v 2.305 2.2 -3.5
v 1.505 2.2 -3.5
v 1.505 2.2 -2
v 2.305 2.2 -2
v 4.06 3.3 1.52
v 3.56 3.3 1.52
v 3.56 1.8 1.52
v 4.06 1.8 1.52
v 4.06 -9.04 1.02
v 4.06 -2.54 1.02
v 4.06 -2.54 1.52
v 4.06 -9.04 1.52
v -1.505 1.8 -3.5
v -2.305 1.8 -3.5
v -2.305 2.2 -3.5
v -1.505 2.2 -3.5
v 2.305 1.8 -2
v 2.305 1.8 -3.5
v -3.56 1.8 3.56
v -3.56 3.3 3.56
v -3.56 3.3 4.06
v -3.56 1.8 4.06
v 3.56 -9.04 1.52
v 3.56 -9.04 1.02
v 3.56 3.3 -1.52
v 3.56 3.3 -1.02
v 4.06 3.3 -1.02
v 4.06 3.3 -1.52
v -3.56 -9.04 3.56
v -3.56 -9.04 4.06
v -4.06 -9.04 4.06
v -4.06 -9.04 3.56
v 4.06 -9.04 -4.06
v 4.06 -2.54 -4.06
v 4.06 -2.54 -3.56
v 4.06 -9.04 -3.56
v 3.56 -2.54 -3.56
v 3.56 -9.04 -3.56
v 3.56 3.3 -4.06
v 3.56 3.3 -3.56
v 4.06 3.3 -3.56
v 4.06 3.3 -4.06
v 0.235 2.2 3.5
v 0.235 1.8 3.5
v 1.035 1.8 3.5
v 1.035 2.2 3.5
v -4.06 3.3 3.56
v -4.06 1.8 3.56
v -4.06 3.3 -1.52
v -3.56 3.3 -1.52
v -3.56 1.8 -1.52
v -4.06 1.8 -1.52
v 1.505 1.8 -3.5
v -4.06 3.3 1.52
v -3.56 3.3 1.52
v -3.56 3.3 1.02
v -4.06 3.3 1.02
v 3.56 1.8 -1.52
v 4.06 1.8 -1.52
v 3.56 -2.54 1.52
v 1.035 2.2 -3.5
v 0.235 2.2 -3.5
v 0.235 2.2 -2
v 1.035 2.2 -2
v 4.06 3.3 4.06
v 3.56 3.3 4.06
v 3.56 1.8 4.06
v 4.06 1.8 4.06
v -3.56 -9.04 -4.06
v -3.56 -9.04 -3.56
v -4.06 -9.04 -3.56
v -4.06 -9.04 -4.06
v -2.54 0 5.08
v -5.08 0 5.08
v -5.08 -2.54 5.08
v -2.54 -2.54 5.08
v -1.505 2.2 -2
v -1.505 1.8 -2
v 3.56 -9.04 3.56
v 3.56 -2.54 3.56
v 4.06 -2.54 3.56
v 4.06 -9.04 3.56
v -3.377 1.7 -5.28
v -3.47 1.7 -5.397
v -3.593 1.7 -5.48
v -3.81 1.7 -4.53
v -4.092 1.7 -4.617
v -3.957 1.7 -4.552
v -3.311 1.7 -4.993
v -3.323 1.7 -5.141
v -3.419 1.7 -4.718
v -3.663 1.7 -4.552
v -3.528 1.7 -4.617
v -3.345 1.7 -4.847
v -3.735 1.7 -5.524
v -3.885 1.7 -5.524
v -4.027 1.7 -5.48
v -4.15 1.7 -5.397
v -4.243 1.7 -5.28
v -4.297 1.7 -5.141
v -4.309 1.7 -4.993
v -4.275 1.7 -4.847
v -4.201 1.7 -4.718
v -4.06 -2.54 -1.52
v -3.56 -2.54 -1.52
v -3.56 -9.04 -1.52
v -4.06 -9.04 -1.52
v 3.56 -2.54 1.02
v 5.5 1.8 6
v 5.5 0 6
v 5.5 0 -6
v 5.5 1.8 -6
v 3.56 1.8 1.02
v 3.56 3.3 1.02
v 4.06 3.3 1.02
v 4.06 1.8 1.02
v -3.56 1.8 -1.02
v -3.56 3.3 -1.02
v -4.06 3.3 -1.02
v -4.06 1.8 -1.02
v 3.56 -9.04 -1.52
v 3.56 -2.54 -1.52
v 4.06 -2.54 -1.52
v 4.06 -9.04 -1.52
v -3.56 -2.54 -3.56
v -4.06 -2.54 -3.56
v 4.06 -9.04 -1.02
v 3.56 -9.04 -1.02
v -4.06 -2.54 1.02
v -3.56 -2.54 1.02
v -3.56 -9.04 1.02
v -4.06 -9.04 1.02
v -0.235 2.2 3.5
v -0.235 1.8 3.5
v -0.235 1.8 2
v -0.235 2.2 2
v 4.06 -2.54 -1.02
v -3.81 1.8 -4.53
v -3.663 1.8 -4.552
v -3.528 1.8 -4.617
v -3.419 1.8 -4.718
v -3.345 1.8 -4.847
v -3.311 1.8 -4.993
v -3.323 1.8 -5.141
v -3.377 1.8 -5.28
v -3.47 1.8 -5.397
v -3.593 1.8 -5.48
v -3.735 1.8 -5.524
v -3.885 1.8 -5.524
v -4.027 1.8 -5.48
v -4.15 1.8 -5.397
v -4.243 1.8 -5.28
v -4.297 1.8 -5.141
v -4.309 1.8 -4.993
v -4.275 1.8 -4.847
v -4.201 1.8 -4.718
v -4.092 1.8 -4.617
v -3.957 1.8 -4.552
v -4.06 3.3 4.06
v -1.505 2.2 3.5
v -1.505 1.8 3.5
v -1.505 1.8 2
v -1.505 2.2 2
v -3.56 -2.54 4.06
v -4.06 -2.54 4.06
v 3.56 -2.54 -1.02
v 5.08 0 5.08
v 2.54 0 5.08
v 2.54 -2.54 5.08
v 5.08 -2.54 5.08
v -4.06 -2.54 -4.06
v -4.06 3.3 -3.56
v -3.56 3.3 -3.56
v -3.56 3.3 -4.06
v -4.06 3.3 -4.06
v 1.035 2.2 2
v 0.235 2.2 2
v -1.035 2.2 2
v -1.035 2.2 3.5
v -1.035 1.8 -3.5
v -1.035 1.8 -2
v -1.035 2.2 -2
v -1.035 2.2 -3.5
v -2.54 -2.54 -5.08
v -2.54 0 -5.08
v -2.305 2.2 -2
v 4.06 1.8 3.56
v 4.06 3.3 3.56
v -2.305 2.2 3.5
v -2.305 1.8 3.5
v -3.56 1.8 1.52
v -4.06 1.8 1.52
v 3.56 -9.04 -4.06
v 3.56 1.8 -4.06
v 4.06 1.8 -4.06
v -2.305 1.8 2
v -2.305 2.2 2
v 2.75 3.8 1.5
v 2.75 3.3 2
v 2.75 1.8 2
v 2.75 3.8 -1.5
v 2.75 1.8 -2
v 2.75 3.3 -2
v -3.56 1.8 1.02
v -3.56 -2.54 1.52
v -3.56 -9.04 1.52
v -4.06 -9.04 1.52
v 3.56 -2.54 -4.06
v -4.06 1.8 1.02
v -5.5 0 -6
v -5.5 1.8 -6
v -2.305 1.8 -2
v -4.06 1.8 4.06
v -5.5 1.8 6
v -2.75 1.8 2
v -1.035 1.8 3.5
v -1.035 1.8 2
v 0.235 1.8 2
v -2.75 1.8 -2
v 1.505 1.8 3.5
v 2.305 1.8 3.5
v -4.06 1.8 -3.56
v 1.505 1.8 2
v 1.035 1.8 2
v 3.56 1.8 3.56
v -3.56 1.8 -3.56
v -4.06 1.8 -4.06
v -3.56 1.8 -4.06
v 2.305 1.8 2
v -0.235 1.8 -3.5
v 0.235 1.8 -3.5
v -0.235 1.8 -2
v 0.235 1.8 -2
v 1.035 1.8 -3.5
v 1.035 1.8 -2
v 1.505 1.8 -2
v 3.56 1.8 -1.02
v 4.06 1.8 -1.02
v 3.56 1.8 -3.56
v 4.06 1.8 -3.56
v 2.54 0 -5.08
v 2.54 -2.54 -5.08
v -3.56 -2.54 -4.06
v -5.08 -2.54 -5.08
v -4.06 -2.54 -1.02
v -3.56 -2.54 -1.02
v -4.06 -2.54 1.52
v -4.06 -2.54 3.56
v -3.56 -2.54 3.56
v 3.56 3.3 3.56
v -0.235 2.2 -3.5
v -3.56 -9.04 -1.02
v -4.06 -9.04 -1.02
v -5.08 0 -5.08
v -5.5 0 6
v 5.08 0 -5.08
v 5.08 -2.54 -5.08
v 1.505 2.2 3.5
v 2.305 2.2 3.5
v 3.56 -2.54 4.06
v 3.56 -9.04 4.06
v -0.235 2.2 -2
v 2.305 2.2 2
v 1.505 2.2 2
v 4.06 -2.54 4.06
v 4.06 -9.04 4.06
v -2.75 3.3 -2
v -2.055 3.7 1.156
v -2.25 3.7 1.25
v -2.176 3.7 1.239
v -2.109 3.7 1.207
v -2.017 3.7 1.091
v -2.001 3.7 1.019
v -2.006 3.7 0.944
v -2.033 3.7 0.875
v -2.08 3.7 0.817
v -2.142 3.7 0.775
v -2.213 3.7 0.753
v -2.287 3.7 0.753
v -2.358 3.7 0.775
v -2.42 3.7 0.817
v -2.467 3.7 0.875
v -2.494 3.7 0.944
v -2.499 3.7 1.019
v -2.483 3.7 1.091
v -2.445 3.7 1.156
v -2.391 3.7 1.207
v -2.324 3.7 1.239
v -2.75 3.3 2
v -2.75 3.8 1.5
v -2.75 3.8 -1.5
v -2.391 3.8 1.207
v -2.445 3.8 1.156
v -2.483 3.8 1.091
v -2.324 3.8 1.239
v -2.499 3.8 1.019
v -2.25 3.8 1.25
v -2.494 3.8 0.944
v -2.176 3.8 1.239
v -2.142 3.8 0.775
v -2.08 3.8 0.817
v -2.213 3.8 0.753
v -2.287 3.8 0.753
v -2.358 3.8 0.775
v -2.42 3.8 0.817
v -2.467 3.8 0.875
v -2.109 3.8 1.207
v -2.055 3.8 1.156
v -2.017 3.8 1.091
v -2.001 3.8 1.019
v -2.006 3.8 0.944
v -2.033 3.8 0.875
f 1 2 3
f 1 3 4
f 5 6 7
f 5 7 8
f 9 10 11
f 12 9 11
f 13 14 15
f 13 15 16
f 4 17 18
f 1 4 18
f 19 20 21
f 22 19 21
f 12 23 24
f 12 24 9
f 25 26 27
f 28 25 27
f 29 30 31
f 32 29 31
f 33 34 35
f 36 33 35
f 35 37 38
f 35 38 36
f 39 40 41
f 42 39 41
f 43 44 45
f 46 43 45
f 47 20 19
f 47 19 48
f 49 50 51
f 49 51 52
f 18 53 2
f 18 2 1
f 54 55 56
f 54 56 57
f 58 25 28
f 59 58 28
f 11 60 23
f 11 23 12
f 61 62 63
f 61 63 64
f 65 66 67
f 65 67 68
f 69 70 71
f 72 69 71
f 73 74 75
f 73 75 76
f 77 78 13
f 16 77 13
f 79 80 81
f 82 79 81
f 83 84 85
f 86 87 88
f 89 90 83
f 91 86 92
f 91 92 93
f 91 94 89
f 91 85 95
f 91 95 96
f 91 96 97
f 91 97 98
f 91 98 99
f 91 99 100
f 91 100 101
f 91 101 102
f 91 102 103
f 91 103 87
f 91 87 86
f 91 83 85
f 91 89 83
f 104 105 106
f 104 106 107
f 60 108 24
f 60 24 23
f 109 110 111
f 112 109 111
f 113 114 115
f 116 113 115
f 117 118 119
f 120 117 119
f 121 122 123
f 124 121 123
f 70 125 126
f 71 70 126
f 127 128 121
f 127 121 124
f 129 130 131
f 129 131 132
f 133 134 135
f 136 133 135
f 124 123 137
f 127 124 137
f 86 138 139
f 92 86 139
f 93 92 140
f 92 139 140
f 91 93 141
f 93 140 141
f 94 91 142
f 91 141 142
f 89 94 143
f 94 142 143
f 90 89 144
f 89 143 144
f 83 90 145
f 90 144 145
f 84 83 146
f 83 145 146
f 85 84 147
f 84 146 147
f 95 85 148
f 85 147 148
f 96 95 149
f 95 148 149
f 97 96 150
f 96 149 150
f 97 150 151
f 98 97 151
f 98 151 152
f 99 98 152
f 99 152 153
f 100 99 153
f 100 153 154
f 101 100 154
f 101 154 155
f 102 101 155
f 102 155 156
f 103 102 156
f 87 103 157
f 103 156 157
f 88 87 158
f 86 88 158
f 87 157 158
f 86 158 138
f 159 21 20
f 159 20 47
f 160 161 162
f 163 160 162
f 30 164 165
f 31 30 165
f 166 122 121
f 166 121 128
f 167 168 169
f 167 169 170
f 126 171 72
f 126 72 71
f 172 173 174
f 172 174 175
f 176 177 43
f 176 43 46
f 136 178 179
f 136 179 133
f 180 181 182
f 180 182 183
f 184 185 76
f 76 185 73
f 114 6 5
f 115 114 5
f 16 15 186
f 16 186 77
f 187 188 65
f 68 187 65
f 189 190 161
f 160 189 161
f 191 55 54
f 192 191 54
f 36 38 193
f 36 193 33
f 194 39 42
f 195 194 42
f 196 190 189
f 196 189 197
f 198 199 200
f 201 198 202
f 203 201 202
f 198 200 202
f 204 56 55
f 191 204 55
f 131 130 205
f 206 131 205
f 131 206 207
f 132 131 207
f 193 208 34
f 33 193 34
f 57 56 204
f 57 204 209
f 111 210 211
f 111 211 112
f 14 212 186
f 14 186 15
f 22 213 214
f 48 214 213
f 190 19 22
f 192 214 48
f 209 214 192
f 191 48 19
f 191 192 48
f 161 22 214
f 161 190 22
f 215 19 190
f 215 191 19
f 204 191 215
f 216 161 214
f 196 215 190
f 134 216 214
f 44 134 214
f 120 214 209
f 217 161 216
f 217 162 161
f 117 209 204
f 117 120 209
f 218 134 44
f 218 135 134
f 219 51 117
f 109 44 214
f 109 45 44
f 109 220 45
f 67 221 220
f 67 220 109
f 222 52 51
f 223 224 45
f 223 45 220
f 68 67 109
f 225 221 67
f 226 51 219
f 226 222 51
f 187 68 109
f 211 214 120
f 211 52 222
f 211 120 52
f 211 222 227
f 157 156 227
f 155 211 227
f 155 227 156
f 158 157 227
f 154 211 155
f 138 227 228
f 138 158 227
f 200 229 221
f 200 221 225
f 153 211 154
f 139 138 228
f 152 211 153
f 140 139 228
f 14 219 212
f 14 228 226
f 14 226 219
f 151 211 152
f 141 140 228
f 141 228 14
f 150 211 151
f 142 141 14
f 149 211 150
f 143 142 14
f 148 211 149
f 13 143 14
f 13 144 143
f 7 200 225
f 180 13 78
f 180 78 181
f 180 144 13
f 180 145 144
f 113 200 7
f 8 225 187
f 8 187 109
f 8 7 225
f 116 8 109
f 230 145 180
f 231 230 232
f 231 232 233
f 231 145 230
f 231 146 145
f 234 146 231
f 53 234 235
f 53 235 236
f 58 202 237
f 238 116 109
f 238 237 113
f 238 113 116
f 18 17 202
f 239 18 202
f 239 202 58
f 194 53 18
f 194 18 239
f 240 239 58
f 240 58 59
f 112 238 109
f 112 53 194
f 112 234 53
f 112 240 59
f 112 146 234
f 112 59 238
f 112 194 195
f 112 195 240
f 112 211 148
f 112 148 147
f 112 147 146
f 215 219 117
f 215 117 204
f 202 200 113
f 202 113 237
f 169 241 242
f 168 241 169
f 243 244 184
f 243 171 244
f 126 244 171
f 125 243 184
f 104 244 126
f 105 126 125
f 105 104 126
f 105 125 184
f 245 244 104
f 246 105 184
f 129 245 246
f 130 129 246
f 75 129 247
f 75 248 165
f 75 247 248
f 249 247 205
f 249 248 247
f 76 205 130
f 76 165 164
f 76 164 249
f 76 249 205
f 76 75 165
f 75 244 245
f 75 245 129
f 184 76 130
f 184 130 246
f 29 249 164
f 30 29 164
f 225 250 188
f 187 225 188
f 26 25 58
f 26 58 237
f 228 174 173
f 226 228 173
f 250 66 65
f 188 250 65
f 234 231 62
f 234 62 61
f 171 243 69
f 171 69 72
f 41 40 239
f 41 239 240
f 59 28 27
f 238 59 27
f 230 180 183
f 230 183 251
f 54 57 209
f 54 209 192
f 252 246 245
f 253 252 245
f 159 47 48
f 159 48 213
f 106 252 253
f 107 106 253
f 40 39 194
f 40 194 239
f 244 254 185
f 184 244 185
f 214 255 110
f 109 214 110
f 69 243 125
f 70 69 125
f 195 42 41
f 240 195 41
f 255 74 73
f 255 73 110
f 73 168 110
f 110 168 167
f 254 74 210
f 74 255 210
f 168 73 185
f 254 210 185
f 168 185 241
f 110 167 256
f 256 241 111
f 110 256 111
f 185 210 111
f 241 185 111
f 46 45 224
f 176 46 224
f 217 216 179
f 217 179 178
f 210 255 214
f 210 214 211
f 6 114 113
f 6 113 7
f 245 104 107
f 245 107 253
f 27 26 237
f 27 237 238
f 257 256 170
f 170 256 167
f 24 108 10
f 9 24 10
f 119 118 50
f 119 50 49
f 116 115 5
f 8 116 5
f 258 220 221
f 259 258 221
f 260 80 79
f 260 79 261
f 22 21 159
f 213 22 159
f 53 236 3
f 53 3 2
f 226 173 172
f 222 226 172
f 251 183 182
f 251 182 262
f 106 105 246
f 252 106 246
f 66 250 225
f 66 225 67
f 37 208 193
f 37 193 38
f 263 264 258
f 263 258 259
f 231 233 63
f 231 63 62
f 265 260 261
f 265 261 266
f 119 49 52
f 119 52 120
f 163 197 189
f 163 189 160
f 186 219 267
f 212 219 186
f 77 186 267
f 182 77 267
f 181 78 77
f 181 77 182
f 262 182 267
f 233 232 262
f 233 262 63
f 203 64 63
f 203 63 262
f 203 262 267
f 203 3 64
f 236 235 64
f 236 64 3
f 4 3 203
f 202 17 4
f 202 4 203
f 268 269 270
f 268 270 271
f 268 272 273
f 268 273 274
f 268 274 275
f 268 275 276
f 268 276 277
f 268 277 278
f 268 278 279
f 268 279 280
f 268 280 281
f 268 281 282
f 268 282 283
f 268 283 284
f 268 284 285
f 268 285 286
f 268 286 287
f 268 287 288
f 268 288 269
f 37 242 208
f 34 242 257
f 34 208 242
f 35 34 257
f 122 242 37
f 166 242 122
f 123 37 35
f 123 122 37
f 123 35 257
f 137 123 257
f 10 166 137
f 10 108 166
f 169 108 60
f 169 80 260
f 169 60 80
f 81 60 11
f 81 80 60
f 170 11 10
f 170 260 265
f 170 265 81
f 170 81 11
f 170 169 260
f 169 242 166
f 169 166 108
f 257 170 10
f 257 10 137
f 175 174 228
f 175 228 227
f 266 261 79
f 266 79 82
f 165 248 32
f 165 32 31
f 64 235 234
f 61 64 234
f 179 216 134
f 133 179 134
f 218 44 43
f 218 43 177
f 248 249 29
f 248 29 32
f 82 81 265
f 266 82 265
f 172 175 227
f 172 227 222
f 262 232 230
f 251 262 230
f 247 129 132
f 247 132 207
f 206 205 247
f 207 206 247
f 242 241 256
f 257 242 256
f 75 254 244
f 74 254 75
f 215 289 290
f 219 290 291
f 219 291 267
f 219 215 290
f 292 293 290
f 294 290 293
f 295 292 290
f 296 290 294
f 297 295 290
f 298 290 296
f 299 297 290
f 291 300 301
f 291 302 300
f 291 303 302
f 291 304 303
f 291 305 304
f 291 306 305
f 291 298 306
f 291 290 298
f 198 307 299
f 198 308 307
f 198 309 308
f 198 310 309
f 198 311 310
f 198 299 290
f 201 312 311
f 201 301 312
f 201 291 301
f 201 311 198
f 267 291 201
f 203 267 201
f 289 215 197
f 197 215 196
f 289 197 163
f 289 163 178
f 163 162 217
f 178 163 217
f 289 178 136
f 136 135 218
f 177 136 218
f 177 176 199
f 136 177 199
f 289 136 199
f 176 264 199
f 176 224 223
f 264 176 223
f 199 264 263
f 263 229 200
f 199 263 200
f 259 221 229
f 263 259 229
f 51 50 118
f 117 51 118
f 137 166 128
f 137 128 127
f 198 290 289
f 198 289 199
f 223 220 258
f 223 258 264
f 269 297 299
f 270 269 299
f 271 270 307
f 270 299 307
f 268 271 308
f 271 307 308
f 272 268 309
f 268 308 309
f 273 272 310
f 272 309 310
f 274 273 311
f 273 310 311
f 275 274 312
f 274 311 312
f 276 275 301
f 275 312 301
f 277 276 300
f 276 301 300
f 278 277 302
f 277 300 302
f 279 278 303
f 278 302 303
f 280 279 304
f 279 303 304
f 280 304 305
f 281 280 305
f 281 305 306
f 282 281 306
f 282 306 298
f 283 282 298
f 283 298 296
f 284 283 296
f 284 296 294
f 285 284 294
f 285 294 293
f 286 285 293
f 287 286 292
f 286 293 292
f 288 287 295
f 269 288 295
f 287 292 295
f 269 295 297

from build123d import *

# Parameters (mm, degrees)
SKETCH1_W           = 11
SKETCH1_H           = 12
BOSS_EXTRUDE1_DEPTH = 1.8
SKETCH2_W           = 2.54
SKETCH2_H           = 10.16
BOSS_EXTRUDE2_DEPTH = 2.54
BOSS_EXTRUDE3_START = -5.84
SKETCH3_W           = 0.5
SKETCH3_H           = 0.5
BOSS_EXTRUDE3_DEPTH = 12.34
SKETCH4_W           = 5.5
SKETCH4_H           = 4
BOSS_EXTRUDE4_DEPTH = 2
CHAMFER1_SIZE       = 0.5
SKETCH5_W           = 0.8
SKETCH5_H           = 7
BOSS_EXTRUDE5_DEPTH = 0.4
SKETCH6_R           = 0.5
CUT_EXTRUDE1_DEPTH  = 0.1
SKETCH7_R           = 0.25
CUT_EXTRUDE2_DEPTH  = 0.1


with BuildPart() as part:
    # Sketch1 → Boss-Extrude1 (new body)
    with BuildSketch(Plane(origin=(0, 0, 0), x_dir=(1, 0, 0), z_dir=(0, 1, 0))):
        Rectangle(SKETCH1_W, SKETCH1_H)
    extrude(amount=BOSS_EXTRUDE1_DEPTH)

    # Sketch2 → Boss-Extrude2 (add)
    with BuildSketch(Plane.XZ):
        with Locations((-3.81, 0)):
            Rectangle(SKETCH2_W, SKETCH2_H)
        with Locations((3.81, 0)):
            Rectangle(SKETCH2_W, SKETCH2_H)
    extrude(amount=BOSS_EXTRUDE2_DEPTH)

    # Sketch3 → Boss-Extrude3 (add)
    with BuildSketch(Plane.XZ.offset(2.54).offset(BOSS_EXTRUDE3_START)):
        with Locations((3.81, 1.27)):
            Rectangle(SKETCH3_W, SKETCH3_H)
        with Locations((3.81, 3.81)):
            Rectangle(SKETCH3_W, SKETCH3_H)
        with Locations((3.81, -1.27)):
            Rectangle(SKETCH3_W, SKETCH3_H)
        with Locations((3.81, -3.81)):
            Rectangle(SKETCH3_W, SKETCH3_H)
    boss_extrude3 = extrude(amount=BOSS_EXTRUDE3_DEPTH)

    # Mirror1: Boss-Extrude3 across plane
    add(boss_extrude3.mirror(Plane(origin=(0, 0, 0), x_dir=(0, 0, 1), z_dir=(1, 0, 0))))

    # Sketch4 → Boss-Extrude4 (add)
    with BuildSketch(Plane(origin=(0, 1.8, 0), x_dir=(1, 0, 0), z_dir=(0, 1, 0))):
        Rectangle(SKETCH4_W, SKETCH4_H)
    extrude(amount=BOSS_EXTRUDE4_DEPTH)

    # Chamfer1
    chamfer1_edges = [part.edges().sort_by_distance(p)[0] for p in [
        (0, 3.8, -2),
        (0, 3.8, 2),
    ]]
    chamfer(chamfer1_edges, length=CHAMFER1_SIZE)

    # Sketch5 → Boss-Extrude5 (add)
    with BuildSketch(Plane(origin=(0, 1.8, 0), x_dir=(1, 0, 0), z_dir=(0, 1, 0))):
        with Locations((-0.635, 0)):
            Rectangle(SKETCH5_W, SKETCH5_H)
        with Locations((-1.905, 0)):
            Rectangle(SKETCH5_W, SKETCH5_H)
        with Locations((0.635, 0)):
            Rectangle(SKETCH5_W, SKETCH5_H)
        with Locations((1.905, 0)):
            Rectangle(SKETCH5_W, SKETCH5_H)
    extrude(amount=BOSS_EXTRUDE5_DEPTH)

    # Sketch6 → Cut-Extrude1 (cut)
    with BuildSketch(Plane(origin=(0, 1.8, 0), x_dir=(1, 0, 0), z_dir=(0, 1, 0))):
        with Locations(Location((-3.81, 5.03, 0), (0, 0, 270))):
            Circle(SKETCH6_R)
    extrude(amount=-CUT_EXTRUDE1_DEPTH, mode=Mode.SUBTRACT)

    # Sketch7 → Cut-Extrude2 (cut)
    with BuildSketch(Plane(origin=(0, 3.8, 0), x_dir=(1, 0, 0), z_dir=(0, 1, 0))):
        with Locations(Location((-2.25, -1, 0), (0, 0, 270))):
            Circle(SKETCH7_R)
    extrude(amount=-CUT_EXTRUDE2_DEPTH, mode=Mode.SUBTRACT)


solid = part.part
